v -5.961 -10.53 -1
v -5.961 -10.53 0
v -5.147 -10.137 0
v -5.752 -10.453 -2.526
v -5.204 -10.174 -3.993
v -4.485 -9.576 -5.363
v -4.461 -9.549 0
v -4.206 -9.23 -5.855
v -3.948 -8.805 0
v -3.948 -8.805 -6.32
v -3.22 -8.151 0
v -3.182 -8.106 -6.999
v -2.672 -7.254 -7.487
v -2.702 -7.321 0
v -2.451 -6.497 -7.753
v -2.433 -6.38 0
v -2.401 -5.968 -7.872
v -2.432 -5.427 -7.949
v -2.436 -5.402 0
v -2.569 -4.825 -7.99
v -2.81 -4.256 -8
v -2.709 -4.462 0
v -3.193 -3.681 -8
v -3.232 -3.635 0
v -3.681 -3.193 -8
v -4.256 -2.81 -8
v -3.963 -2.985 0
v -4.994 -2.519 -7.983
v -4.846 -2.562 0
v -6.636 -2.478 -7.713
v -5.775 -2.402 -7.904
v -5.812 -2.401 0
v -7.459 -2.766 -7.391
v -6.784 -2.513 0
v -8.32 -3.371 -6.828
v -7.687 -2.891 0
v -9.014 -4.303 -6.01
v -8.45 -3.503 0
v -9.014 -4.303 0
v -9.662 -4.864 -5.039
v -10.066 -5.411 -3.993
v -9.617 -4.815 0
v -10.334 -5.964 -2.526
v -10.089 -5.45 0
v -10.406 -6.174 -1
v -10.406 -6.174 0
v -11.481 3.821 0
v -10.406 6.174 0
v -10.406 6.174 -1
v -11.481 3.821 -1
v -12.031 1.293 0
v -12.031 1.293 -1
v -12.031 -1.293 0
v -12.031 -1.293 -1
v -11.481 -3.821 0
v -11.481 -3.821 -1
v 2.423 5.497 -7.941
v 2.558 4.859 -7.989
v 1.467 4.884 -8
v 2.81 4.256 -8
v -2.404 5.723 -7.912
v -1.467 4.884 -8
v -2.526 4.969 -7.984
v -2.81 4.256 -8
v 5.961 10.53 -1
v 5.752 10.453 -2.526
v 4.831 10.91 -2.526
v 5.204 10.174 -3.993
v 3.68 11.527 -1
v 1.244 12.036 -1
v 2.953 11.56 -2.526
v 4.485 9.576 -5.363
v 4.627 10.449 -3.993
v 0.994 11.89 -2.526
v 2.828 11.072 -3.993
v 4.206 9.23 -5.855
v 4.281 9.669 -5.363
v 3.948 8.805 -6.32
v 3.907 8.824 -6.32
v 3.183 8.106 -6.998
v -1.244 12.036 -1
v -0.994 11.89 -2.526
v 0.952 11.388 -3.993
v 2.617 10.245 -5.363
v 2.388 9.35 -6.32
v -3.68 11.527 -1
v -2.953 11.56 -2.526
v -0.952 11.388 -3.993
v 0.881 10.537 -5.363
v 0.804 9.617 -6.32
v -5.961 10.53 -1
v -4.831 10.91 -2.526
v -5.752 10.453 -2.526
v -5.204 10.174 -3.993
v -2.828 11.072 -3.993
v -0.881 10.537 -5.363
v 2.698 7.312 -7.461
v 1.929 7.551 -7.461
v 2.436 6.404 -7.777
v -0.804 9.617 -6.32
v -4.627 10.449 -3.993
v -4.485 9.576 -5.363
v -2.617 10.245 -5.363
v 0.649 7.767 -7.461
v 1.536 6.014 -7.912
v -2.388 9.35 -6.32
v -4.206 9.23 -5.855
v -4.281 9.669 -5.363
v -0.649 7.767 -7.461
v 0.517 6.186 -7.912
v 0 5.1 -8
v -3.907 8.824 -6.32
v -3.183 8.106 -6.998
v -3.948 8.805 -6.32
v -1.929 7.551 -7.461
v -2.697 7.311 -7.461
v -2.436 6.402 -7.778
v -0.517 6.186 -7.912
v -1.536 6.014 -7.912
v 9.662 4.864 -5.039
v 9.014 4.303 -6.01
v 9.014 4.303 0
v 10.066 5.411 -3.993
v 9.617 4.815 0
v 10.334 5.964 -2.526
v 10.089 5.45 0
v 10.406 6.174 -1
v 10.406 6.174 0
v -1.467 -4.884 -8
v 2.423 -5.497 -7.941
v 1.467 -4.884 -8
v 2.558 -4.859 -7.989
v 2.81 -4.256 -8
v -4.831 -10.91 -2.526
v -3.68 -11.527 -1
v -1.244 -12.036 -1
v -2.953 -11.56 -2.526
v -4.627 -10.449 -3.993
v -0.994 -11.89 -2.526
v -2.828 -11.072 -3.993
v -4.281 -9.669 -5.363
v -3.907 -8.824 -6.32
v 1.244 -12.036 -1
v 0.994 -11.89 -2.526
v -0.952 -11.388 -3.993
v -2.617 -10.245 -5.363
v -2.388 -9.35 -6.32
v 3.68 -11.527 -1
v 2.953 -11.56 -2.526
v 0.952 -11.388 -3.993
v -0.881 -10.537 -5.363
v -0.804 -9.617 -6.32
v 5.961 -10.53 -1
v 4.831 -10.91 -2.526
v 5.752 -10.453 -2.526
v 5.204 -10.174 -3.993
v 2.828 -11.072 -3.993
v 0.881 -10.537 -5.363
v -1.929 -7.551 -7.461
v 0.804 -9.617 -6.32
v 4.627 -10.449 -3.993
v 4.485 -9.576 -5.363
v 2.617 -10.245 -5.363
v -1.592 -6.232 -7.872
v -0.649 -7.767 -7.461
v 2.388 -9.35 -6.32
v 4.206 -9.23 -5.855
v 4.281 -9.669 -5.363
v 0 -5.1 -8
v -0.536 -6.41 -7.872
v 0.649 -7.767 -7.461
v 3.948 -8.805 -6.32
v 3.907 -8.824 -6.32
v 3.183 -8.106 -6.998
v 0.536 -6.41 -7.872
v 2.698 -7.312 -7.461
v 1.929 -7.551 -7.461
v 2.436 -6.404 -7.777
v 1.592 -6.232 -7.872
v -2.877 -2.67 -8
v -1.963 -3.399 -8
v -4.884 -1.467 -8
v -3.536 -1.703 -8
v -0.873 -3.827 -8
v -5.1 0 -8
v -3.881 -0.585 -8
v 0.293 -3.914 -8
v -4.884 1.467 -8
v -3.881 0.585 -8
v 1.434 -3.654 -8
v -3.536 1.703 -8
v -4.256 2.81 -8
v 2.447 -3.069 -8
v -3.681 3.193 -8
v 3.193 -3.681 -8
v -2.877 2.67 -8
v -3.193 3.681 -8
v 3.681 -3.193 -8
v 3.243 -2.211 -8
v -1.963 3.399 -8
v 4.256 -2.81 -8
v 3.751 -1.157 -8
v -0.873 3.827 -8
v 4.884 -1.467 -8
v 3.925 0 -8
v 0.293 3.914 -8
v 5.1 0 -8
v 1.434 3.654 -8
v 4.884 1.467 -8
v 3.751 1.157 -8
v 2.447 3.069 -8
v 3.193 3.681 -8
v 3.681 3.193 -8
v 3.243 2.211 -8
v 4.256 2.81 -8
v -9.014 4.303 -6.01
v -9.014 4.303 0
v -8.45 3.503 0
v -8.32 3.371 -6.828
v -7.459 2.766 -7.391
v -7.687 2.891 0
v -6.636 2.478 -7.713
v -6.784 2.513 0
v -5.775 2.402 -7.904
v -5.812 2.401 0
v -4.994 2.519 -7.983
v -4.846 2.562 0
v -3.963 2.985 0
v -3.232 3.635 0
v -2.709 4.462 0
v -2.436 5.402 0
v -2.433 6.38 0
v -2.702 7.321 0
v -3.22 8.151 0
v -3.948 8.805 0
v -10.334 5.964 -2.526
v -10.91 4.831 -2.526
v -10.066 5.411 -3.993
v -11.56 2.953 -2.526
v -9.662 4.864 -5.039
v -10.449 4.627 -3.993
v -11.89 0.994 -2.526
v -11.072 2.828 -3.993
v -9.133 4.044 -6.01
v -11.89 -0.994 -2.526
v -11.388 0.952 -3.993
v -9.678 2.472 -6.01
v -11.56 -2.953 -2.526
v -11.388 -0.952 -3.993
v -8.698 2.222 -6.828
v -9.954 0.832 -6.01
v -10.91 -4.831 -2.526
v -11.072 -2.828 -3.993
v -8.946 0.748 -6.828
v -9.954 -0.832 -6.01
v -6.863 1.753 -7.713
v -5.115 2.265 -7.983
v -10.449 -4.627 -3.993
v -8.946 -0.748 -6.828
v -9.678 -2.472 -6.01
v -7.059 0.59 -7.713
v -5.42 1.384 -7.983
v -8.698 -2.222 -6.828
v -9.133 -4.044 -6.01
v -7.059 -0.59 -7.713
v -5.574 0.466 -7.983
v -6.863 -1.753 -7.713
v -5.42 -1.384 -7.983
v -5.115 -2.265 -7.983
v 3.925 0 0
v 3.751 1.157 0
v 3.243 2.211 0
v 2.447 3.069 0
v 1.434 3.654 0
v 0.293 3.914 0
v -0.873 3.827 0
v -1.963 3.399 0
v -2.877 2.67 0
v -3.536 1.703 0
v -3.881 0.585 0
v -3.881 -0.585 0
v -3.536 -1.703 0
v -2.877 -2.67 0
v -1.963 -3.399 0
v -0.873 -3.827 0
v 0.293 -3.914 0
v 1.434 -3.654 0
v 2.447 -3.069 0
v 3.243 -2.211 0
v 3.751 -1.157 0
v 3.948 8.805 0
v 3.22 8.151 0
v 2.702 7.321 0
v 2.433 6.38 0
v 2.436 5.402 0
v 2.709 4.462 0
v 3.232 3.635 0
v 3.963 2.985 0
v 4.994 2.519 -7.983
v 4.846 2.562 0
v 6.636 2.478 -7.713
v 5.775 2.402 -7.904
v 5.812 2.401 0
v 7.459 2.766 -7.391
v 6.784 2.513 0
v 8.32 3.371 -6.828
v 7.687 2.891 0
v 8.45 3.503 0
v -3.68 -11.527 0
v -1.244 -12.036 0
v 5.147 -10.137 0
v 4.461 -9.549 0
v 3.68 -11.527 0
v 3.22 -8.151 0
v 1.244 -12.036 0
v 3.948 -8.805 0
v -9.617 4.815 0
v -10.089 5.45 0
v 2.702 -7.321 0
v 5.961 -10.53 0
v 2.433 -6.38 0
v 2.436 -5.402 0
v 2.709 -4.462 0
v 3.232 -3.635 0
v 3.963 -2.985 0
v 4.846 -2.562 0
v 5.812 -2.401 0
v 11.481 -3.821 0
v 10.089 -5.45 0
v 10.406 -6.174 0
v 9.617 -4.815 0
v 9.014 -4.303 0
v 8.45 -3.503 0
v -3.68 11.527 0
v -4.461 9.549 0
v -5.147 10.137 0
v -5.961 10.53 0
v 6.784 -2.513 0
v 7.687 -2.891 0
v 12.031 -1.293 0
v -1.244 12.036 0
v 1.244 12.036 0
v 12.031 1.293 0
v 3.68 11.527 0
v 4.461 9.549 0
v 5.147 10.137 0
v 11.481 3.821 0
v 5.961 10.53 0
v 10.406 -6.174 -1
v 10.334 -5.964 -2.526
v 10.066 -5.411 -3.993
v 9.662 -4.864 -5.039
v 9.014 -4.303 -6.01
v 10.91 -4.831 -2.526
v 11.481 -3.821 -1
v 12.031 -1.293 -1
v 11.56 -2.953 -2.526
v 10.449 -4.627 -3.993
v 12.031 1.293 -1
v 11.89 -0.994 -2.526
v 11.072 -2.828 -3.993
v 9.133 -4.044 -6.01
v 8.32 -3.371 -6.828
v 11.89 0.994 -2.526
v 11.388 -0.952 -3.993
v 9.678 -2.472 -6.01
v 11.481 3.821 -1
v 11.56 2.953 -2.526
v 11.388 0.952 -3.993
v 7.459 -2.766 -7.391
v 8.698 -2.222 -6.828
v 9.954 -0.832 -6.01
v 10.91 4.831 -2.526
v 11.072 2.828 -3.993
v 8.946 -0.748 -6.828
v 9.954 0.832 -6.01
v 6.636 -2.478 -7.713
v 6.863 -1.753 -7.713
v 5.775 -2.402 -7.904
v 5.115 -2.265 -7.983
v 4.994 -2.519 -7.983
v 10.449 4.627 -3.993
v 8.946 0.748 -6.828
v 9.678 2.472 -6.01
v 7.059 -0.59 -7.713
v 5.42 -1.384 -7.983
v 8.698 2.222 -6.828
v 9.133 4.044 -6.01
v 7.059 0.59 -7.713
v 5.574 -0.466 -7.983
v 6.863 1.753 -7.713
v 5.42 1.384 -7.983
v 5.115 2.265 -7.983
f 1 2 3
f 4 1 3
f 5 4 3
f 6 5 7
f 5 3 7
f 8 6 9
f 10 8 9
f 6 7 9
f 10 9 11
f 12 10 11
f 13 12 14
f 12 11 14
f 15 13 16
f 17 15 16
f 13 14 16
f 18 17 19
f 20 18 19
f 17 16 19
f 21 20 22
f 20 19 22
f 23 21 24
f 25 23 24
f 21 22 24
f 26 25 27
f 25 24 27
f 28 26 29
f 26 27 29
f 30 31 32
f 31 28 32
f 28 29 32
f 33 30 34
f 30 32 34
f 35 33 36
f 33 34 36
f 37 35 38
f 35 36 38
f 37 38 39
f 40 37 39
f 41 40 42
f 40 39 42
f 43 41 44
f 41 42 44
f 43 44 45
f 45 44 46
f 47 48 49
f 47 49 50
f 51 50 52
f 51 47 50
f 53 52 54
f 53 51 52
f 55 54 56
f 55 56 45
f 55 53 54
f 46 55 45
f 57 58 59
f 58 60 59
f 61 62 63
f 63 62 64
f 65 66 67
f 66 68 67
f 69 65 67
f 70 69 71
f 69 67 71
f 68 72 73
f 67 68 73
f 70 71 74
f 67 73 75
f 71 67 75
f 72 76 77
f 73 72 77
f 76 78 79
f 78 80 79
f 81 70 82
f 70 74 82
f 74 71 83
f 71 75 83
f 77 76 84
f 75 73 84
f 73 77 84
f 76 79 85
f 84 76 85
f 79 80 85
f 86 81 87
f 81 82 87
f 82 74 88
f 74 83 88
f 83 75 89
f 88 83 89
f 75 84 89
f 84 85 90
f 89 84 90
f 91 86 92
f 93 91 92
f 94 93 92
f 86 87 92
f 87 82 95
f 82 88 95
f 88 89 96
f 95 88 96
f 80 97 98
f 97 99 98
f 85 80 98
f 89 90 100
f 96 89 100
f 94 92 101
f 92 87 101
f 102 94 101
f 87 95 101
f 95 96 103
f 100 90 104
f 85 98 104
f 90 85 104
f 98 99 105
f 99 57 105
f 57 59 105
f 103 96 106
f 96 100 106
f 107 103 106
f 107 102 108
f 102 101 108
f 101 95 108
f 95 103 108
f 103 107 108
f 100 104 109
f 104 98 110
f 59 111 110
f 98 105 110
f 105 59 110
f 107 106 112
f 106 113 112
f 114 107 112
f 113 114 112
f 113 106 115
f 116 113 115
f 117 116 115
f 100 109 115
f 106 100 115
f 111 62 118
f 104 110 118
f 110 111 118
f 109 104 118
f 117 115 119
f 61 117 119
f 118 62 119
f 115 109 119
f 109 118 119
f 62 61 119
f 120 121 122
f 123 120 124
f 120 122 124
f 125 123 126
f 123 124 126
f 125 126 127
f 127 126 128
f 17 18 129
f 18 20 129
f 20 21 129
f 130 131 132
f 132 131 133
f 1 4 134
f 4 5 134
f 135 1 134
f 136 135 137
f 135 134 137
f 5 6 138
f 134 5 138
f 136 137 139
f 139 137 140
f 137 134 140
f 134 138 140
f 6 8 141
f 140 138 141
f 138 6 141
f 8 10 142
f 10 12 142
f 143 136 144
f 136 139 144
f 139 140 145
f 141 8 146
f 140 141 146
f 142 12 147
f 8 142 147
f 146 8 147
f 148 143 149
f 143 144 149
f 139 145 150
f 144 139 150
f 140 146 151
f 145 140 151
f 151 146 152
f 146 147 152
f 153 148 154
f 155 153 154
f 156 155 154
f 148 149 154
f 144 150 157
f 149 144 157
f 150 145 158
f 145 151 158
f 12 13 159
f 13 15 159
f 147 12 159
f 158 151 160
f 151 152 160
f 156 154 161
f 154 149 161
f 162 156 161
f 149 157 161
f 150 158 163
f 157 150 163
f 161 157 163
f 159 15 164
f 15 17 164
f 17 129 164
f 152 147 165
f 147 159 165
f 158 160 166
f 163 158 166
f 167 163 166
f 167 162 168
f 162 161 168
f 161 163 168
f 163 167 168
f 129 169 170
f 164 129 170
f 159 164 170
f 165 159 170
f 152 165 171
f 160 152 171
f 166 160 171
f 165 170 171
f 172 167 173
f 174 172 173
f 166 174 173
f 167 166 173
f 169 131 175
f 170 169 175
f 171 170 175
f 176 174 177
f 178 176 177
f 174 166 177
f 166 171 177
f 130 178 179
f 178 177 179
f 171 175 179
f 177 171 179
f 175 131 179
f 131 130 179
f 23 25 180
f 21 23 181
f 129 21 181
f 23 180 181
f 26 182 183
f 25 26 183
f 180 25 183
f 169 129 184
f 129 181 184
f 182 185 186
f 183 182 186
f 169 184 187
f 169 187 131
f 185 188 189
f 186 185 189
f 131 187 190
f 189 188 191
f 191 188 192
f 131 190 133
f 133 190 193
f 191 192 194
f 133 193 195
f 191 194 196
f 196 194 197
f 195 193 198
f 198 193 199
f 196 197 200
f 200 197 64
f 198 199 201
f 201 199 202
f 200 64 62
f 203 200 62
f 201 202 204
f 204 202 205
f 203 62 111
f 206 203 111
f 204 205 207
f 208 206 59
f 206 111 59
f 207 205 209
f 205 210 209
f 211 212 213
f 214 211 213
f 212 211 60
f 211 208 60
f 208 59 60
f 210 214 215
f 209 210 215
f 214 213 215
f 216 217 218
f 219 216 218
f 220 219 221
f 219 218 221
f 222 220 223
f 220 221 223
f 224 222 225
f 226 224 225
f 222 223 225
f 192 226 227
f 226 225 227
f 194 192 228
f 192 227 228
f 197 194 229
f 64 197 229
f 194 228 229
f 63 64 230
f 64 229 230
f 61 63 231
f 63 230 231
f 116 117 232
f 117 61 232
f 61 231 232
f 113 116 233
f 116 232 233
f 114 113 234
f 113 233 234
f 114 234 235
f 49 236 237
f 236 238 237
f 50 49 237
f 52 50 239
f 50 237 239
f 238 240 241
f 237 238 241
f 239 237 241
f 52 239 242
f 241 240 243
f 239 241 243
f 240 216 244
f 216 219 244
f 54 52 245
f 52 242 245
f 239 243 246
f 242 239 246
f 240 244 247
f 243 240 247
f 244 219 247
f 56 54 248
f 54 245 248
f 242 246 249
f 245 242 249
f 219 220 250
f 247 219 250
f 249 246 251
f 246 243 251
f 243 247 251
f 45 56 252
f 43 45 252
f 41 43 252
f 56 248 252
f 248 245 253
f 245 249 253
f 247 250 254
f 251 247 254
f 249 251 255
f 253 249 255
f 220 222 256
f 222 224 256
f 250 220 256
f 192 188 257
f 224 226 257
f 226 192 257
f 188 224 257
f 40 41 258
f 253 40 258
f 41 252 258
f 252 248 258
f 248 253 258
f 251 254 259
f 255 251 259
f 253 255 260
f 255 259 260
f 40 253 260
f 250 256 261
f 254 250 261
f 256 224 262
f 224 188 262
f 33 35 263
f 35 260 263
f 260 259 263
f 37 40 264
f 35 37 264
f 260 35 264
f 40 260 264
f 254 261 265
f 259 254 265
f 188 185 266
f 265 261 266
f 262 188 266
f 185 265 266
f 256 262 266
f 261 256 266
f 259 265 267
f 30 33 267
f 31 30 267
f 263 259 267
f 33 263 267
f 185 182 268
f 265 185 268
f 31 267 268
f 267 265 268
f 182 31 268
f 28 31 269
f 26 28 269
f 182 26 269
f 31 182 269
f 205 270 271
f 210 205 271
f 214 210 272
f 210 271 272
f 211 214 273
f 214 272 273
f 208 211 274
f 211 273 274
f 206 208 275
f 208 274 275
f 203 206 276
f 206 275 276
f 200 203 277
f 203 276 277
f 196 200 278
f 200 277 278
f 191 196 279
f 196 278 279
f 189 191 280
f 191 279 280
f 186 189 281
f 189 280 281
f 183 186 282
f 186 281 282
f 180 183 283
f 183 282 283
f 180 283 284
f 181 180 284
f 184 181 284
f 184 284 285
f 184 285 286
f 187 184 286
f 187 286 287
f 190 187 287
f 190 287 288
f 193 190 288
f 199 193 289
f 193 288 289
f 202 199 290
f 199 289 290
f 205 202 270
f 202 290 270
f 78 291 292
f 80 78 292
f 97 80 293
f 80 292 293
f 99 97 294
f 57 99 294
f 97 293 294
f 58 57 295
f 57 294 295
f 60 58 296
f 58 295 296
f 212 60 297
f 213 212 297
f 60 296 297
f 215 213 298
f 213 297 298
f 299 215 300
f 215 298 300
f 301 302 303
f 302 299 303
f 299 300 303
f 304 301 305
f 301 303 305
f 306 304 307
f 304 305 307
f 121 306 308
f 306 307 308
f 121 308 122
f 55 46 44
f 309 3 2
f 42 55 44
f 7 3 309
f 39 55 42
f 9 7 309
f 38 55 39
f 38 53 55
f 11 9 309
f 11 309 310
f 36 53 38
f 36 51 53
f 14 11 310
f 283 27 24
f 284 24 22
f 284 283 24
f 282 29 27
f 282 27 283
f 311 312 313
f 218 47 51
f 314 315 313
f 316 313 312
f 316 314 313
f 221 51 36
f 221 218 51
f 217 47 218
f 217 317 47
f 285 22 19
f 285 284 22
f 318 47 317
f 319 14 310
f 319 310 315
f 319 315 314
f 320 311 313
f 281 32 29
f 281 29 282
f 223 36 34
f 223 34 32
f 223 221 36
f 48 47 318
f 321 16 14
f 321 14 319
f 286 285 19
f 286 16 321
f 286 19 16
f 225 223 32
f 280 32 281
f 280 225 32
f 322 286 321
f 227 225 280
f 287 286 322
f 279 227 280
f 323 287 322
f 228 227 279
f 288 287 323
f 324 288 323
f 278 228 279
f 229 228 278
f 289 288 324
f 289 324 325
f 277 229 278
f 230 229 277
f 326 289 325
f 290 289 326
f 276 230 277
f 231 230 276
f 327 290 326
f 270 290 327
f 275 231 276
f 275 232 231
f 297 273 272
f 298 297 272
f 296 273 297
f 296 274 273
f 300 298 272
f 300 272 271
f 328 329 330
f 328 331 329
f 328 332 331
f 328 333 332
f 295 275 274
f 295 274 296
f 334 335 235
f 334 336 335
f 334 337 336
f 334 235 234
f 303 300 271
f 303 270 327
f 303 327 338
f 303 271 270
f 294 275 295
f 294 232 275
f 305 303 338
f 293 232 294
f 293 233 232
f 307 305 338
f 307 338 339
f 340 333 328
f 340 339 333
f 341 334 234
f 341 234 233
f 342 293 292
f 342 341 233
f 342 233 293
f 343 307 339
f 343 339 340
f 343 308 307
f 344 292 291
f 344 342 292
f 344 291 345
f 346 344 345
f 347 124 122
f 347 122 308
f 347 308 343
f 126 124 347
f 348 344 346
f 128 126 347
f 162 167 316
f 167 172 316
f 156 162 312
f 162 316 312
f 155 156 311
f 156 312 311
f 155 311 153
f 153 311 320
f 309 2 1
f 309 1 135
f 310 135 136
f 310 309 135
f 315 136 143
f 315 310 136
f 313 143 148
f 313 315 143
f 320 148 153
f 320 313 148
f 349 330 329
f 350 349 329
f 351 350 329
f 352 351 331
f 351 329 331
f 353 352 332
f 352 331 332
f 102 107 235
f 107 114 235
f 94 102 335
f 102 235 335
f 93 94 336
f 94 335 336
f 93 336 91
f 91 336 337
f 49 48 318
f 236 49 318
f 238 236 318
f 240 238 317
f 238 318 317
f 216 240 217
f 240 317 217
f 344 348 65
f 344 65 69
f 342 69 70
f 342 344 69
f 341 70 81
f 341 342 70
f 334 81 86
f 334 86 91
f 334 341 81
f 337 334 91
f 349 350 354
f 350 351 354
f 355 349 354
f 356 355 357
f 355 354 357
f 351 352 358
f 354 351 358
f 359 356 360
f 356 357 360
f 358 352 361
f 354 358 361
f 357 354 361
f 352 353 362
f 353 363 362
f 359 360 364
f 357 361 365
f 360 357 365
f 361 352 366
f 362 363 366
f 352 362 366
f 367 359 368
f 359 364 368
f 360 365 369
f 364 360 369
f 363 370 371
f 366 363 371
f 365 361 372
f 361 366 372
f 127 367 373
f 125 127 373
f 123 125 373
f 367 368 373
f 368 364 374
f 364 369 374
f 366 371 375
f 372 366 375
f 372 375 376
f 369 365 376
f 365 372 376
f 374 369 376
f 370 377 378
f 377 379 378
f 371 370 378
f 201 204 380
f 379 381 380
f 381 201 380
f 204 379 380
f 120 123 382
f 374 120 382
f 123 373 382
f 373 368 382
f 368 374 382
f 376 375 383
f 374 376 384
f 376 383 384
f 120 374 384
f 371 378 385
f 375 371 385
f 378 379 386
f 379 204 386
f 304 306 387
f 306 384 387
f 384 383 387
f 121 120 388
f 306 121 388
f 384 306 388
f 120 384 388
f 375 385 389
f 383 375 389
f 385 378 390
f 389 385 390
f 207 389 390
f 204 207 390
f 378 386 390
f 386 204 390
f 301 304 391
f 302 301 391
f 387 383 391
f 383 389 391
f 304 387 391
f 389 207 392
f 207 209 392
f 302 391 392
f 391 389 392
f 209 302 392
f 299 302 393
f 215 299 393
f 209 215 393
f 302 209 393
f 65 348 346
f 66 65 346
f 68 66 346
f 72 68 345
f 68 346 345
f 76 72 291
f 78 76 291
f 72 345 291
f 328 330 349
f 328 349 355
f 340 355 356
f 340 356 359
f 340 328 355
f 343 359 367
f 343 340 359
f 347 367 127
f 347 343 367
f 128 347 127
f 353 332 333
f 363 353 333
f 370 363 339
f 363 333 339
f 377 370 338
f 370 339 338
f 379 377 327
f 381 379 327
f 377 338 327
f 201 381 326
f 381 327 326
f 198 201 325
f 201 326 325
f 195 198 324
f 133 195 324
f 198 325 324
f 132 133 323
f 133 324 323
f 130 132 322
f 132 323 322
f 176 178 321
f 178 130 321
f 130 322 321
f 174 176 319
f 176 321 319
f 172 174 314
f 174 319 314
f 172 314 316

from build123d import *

# Parameters (mm, degrees)
F0_R           = 12.1
F0_R_2         = 3.925
F1_DEPTH       = 8
F2_D           = 5
F2_DEPTH       = 12
F2_CBORE_D     = 7
F2_CBORE_DEPTH = 9
F2_TIP         = 1.5021515476
F3_R           = 7


# Not quite as in the source:
# - a feature names something its author has since deleted; it is built from what else it names


with BuildPart() as f1:
    # F0 (on Top) → F1 (new body)
    with BuildSketch(Plane.XY):
        Circle(F0_R)
        with BuildLine():
            Line((-8.3705968588, -6.0454343887), (-7.2080156238, -4.737418765))
            ThreePointArc((-7.2080156238, -4.737418765), (-4.737418765, -4.5919843762), (-4.5919843762, -7.062581235))
            Line((-4.5919843762, -7.062581235), (-5.7545656113, -8.3705968588))
            ThreePointArc((-5.7545656113, -8.3705968588), (-8.22516247, -8.5160312475), (-8.3705968588, -6.0454343887))
        make_face(mode=Mode.SUBTRACT)
        with BuildLine():
            ThreePointArc((4.5919843762, -7.062581235), (4.737418765, -4.5919843762), (7.2080156238, -4.737418765))
            Line((7.2080156238, -4.737418765), (8.3705968588, -6.0454343887))
            ThreePointArc((8.3705968588, -6.0454343887), (8.22516247, -8.5160312475), (5.7545656113, -8.3705968588))
            Line((5.7545656113, -8.3705968588), (4.5919843762, -7.062581235))
        make_face(mode=Mode.SUBTRACT)
        with BuildLine():
            ThreePointArc((-8.3705968588, 6.0454343887), (-8.22516247, 8.5160312475), (-5.7545656113, 8.3705968588))
            Line((-5.7545656113, 8.3705968588), (-4.5919843762, 7.062581235))
            ThreePointArc((-4.5919843762, 7.062581235), (-4.737418765, 4.5919843762), (-7.2080156238, 4.737418765))
            Line((-7.2080156238, 4.737418765), (-8.3705968588, 6.0454343887))
        make_face(mode=Mode.SUBTRACT)
        Circle(F0_R_2, mode=Mode.SUBTRACT)
        with BuildLine():
            Line((8.3705968588, 6.0454343887), (7.2080156238, 4.737418765))
            ThreePointArc((7.2080156238, 4.737418765), (4.737418765, 4.5919843762), (4.5919843762, 7.062581235))
            Line((4.5919843762, 7.062581235), (5.7545656113, 8.3705968588))
            ThreePointArc((5.7545656113, 8.3705968588), (8.22516247, 8.5160312475), (8.3705968588, 6.0454343887))
        make_face(mode=Mode.SUBTRACT)
    extrude(amount=-F1_DEPTH)

    # F2
    with Locations(Plane.XY):
        with Locations((-5.9, 5.9), (-7.062581235, 7.2080156238), (-7.062581235, -7.2080156238), (7.062581235, -7.2080156238), (5.9, -5.9), (5.9, 5.9), (7.062581235, 7.2080156238), (-5.9, -5.9)):
            CounterBoreHole(F2_D / 2, F2_CBORE_D / 2, F2_CBORE_DEPTH, depth=F2_DEPTH)
            with Locations((0, 0, -(F2_DEPTH + F2_TIP / 2))):  # 118° drill point
                Cone(0, F2_D / 2, F2_TIP, mode=Mode.SUBTRACT)

    # F3
    f3_edges = [f1.edges().sort_by_distance(p)[0] for p in [
        (12.1, 0, -8),
        (0, 12.1, -8),
        (-12.1, 0, -8),
        (0, -12.1, -8),
    ]]
    fillet(f3_edges, radius=F3_R)


solid = f1.part
